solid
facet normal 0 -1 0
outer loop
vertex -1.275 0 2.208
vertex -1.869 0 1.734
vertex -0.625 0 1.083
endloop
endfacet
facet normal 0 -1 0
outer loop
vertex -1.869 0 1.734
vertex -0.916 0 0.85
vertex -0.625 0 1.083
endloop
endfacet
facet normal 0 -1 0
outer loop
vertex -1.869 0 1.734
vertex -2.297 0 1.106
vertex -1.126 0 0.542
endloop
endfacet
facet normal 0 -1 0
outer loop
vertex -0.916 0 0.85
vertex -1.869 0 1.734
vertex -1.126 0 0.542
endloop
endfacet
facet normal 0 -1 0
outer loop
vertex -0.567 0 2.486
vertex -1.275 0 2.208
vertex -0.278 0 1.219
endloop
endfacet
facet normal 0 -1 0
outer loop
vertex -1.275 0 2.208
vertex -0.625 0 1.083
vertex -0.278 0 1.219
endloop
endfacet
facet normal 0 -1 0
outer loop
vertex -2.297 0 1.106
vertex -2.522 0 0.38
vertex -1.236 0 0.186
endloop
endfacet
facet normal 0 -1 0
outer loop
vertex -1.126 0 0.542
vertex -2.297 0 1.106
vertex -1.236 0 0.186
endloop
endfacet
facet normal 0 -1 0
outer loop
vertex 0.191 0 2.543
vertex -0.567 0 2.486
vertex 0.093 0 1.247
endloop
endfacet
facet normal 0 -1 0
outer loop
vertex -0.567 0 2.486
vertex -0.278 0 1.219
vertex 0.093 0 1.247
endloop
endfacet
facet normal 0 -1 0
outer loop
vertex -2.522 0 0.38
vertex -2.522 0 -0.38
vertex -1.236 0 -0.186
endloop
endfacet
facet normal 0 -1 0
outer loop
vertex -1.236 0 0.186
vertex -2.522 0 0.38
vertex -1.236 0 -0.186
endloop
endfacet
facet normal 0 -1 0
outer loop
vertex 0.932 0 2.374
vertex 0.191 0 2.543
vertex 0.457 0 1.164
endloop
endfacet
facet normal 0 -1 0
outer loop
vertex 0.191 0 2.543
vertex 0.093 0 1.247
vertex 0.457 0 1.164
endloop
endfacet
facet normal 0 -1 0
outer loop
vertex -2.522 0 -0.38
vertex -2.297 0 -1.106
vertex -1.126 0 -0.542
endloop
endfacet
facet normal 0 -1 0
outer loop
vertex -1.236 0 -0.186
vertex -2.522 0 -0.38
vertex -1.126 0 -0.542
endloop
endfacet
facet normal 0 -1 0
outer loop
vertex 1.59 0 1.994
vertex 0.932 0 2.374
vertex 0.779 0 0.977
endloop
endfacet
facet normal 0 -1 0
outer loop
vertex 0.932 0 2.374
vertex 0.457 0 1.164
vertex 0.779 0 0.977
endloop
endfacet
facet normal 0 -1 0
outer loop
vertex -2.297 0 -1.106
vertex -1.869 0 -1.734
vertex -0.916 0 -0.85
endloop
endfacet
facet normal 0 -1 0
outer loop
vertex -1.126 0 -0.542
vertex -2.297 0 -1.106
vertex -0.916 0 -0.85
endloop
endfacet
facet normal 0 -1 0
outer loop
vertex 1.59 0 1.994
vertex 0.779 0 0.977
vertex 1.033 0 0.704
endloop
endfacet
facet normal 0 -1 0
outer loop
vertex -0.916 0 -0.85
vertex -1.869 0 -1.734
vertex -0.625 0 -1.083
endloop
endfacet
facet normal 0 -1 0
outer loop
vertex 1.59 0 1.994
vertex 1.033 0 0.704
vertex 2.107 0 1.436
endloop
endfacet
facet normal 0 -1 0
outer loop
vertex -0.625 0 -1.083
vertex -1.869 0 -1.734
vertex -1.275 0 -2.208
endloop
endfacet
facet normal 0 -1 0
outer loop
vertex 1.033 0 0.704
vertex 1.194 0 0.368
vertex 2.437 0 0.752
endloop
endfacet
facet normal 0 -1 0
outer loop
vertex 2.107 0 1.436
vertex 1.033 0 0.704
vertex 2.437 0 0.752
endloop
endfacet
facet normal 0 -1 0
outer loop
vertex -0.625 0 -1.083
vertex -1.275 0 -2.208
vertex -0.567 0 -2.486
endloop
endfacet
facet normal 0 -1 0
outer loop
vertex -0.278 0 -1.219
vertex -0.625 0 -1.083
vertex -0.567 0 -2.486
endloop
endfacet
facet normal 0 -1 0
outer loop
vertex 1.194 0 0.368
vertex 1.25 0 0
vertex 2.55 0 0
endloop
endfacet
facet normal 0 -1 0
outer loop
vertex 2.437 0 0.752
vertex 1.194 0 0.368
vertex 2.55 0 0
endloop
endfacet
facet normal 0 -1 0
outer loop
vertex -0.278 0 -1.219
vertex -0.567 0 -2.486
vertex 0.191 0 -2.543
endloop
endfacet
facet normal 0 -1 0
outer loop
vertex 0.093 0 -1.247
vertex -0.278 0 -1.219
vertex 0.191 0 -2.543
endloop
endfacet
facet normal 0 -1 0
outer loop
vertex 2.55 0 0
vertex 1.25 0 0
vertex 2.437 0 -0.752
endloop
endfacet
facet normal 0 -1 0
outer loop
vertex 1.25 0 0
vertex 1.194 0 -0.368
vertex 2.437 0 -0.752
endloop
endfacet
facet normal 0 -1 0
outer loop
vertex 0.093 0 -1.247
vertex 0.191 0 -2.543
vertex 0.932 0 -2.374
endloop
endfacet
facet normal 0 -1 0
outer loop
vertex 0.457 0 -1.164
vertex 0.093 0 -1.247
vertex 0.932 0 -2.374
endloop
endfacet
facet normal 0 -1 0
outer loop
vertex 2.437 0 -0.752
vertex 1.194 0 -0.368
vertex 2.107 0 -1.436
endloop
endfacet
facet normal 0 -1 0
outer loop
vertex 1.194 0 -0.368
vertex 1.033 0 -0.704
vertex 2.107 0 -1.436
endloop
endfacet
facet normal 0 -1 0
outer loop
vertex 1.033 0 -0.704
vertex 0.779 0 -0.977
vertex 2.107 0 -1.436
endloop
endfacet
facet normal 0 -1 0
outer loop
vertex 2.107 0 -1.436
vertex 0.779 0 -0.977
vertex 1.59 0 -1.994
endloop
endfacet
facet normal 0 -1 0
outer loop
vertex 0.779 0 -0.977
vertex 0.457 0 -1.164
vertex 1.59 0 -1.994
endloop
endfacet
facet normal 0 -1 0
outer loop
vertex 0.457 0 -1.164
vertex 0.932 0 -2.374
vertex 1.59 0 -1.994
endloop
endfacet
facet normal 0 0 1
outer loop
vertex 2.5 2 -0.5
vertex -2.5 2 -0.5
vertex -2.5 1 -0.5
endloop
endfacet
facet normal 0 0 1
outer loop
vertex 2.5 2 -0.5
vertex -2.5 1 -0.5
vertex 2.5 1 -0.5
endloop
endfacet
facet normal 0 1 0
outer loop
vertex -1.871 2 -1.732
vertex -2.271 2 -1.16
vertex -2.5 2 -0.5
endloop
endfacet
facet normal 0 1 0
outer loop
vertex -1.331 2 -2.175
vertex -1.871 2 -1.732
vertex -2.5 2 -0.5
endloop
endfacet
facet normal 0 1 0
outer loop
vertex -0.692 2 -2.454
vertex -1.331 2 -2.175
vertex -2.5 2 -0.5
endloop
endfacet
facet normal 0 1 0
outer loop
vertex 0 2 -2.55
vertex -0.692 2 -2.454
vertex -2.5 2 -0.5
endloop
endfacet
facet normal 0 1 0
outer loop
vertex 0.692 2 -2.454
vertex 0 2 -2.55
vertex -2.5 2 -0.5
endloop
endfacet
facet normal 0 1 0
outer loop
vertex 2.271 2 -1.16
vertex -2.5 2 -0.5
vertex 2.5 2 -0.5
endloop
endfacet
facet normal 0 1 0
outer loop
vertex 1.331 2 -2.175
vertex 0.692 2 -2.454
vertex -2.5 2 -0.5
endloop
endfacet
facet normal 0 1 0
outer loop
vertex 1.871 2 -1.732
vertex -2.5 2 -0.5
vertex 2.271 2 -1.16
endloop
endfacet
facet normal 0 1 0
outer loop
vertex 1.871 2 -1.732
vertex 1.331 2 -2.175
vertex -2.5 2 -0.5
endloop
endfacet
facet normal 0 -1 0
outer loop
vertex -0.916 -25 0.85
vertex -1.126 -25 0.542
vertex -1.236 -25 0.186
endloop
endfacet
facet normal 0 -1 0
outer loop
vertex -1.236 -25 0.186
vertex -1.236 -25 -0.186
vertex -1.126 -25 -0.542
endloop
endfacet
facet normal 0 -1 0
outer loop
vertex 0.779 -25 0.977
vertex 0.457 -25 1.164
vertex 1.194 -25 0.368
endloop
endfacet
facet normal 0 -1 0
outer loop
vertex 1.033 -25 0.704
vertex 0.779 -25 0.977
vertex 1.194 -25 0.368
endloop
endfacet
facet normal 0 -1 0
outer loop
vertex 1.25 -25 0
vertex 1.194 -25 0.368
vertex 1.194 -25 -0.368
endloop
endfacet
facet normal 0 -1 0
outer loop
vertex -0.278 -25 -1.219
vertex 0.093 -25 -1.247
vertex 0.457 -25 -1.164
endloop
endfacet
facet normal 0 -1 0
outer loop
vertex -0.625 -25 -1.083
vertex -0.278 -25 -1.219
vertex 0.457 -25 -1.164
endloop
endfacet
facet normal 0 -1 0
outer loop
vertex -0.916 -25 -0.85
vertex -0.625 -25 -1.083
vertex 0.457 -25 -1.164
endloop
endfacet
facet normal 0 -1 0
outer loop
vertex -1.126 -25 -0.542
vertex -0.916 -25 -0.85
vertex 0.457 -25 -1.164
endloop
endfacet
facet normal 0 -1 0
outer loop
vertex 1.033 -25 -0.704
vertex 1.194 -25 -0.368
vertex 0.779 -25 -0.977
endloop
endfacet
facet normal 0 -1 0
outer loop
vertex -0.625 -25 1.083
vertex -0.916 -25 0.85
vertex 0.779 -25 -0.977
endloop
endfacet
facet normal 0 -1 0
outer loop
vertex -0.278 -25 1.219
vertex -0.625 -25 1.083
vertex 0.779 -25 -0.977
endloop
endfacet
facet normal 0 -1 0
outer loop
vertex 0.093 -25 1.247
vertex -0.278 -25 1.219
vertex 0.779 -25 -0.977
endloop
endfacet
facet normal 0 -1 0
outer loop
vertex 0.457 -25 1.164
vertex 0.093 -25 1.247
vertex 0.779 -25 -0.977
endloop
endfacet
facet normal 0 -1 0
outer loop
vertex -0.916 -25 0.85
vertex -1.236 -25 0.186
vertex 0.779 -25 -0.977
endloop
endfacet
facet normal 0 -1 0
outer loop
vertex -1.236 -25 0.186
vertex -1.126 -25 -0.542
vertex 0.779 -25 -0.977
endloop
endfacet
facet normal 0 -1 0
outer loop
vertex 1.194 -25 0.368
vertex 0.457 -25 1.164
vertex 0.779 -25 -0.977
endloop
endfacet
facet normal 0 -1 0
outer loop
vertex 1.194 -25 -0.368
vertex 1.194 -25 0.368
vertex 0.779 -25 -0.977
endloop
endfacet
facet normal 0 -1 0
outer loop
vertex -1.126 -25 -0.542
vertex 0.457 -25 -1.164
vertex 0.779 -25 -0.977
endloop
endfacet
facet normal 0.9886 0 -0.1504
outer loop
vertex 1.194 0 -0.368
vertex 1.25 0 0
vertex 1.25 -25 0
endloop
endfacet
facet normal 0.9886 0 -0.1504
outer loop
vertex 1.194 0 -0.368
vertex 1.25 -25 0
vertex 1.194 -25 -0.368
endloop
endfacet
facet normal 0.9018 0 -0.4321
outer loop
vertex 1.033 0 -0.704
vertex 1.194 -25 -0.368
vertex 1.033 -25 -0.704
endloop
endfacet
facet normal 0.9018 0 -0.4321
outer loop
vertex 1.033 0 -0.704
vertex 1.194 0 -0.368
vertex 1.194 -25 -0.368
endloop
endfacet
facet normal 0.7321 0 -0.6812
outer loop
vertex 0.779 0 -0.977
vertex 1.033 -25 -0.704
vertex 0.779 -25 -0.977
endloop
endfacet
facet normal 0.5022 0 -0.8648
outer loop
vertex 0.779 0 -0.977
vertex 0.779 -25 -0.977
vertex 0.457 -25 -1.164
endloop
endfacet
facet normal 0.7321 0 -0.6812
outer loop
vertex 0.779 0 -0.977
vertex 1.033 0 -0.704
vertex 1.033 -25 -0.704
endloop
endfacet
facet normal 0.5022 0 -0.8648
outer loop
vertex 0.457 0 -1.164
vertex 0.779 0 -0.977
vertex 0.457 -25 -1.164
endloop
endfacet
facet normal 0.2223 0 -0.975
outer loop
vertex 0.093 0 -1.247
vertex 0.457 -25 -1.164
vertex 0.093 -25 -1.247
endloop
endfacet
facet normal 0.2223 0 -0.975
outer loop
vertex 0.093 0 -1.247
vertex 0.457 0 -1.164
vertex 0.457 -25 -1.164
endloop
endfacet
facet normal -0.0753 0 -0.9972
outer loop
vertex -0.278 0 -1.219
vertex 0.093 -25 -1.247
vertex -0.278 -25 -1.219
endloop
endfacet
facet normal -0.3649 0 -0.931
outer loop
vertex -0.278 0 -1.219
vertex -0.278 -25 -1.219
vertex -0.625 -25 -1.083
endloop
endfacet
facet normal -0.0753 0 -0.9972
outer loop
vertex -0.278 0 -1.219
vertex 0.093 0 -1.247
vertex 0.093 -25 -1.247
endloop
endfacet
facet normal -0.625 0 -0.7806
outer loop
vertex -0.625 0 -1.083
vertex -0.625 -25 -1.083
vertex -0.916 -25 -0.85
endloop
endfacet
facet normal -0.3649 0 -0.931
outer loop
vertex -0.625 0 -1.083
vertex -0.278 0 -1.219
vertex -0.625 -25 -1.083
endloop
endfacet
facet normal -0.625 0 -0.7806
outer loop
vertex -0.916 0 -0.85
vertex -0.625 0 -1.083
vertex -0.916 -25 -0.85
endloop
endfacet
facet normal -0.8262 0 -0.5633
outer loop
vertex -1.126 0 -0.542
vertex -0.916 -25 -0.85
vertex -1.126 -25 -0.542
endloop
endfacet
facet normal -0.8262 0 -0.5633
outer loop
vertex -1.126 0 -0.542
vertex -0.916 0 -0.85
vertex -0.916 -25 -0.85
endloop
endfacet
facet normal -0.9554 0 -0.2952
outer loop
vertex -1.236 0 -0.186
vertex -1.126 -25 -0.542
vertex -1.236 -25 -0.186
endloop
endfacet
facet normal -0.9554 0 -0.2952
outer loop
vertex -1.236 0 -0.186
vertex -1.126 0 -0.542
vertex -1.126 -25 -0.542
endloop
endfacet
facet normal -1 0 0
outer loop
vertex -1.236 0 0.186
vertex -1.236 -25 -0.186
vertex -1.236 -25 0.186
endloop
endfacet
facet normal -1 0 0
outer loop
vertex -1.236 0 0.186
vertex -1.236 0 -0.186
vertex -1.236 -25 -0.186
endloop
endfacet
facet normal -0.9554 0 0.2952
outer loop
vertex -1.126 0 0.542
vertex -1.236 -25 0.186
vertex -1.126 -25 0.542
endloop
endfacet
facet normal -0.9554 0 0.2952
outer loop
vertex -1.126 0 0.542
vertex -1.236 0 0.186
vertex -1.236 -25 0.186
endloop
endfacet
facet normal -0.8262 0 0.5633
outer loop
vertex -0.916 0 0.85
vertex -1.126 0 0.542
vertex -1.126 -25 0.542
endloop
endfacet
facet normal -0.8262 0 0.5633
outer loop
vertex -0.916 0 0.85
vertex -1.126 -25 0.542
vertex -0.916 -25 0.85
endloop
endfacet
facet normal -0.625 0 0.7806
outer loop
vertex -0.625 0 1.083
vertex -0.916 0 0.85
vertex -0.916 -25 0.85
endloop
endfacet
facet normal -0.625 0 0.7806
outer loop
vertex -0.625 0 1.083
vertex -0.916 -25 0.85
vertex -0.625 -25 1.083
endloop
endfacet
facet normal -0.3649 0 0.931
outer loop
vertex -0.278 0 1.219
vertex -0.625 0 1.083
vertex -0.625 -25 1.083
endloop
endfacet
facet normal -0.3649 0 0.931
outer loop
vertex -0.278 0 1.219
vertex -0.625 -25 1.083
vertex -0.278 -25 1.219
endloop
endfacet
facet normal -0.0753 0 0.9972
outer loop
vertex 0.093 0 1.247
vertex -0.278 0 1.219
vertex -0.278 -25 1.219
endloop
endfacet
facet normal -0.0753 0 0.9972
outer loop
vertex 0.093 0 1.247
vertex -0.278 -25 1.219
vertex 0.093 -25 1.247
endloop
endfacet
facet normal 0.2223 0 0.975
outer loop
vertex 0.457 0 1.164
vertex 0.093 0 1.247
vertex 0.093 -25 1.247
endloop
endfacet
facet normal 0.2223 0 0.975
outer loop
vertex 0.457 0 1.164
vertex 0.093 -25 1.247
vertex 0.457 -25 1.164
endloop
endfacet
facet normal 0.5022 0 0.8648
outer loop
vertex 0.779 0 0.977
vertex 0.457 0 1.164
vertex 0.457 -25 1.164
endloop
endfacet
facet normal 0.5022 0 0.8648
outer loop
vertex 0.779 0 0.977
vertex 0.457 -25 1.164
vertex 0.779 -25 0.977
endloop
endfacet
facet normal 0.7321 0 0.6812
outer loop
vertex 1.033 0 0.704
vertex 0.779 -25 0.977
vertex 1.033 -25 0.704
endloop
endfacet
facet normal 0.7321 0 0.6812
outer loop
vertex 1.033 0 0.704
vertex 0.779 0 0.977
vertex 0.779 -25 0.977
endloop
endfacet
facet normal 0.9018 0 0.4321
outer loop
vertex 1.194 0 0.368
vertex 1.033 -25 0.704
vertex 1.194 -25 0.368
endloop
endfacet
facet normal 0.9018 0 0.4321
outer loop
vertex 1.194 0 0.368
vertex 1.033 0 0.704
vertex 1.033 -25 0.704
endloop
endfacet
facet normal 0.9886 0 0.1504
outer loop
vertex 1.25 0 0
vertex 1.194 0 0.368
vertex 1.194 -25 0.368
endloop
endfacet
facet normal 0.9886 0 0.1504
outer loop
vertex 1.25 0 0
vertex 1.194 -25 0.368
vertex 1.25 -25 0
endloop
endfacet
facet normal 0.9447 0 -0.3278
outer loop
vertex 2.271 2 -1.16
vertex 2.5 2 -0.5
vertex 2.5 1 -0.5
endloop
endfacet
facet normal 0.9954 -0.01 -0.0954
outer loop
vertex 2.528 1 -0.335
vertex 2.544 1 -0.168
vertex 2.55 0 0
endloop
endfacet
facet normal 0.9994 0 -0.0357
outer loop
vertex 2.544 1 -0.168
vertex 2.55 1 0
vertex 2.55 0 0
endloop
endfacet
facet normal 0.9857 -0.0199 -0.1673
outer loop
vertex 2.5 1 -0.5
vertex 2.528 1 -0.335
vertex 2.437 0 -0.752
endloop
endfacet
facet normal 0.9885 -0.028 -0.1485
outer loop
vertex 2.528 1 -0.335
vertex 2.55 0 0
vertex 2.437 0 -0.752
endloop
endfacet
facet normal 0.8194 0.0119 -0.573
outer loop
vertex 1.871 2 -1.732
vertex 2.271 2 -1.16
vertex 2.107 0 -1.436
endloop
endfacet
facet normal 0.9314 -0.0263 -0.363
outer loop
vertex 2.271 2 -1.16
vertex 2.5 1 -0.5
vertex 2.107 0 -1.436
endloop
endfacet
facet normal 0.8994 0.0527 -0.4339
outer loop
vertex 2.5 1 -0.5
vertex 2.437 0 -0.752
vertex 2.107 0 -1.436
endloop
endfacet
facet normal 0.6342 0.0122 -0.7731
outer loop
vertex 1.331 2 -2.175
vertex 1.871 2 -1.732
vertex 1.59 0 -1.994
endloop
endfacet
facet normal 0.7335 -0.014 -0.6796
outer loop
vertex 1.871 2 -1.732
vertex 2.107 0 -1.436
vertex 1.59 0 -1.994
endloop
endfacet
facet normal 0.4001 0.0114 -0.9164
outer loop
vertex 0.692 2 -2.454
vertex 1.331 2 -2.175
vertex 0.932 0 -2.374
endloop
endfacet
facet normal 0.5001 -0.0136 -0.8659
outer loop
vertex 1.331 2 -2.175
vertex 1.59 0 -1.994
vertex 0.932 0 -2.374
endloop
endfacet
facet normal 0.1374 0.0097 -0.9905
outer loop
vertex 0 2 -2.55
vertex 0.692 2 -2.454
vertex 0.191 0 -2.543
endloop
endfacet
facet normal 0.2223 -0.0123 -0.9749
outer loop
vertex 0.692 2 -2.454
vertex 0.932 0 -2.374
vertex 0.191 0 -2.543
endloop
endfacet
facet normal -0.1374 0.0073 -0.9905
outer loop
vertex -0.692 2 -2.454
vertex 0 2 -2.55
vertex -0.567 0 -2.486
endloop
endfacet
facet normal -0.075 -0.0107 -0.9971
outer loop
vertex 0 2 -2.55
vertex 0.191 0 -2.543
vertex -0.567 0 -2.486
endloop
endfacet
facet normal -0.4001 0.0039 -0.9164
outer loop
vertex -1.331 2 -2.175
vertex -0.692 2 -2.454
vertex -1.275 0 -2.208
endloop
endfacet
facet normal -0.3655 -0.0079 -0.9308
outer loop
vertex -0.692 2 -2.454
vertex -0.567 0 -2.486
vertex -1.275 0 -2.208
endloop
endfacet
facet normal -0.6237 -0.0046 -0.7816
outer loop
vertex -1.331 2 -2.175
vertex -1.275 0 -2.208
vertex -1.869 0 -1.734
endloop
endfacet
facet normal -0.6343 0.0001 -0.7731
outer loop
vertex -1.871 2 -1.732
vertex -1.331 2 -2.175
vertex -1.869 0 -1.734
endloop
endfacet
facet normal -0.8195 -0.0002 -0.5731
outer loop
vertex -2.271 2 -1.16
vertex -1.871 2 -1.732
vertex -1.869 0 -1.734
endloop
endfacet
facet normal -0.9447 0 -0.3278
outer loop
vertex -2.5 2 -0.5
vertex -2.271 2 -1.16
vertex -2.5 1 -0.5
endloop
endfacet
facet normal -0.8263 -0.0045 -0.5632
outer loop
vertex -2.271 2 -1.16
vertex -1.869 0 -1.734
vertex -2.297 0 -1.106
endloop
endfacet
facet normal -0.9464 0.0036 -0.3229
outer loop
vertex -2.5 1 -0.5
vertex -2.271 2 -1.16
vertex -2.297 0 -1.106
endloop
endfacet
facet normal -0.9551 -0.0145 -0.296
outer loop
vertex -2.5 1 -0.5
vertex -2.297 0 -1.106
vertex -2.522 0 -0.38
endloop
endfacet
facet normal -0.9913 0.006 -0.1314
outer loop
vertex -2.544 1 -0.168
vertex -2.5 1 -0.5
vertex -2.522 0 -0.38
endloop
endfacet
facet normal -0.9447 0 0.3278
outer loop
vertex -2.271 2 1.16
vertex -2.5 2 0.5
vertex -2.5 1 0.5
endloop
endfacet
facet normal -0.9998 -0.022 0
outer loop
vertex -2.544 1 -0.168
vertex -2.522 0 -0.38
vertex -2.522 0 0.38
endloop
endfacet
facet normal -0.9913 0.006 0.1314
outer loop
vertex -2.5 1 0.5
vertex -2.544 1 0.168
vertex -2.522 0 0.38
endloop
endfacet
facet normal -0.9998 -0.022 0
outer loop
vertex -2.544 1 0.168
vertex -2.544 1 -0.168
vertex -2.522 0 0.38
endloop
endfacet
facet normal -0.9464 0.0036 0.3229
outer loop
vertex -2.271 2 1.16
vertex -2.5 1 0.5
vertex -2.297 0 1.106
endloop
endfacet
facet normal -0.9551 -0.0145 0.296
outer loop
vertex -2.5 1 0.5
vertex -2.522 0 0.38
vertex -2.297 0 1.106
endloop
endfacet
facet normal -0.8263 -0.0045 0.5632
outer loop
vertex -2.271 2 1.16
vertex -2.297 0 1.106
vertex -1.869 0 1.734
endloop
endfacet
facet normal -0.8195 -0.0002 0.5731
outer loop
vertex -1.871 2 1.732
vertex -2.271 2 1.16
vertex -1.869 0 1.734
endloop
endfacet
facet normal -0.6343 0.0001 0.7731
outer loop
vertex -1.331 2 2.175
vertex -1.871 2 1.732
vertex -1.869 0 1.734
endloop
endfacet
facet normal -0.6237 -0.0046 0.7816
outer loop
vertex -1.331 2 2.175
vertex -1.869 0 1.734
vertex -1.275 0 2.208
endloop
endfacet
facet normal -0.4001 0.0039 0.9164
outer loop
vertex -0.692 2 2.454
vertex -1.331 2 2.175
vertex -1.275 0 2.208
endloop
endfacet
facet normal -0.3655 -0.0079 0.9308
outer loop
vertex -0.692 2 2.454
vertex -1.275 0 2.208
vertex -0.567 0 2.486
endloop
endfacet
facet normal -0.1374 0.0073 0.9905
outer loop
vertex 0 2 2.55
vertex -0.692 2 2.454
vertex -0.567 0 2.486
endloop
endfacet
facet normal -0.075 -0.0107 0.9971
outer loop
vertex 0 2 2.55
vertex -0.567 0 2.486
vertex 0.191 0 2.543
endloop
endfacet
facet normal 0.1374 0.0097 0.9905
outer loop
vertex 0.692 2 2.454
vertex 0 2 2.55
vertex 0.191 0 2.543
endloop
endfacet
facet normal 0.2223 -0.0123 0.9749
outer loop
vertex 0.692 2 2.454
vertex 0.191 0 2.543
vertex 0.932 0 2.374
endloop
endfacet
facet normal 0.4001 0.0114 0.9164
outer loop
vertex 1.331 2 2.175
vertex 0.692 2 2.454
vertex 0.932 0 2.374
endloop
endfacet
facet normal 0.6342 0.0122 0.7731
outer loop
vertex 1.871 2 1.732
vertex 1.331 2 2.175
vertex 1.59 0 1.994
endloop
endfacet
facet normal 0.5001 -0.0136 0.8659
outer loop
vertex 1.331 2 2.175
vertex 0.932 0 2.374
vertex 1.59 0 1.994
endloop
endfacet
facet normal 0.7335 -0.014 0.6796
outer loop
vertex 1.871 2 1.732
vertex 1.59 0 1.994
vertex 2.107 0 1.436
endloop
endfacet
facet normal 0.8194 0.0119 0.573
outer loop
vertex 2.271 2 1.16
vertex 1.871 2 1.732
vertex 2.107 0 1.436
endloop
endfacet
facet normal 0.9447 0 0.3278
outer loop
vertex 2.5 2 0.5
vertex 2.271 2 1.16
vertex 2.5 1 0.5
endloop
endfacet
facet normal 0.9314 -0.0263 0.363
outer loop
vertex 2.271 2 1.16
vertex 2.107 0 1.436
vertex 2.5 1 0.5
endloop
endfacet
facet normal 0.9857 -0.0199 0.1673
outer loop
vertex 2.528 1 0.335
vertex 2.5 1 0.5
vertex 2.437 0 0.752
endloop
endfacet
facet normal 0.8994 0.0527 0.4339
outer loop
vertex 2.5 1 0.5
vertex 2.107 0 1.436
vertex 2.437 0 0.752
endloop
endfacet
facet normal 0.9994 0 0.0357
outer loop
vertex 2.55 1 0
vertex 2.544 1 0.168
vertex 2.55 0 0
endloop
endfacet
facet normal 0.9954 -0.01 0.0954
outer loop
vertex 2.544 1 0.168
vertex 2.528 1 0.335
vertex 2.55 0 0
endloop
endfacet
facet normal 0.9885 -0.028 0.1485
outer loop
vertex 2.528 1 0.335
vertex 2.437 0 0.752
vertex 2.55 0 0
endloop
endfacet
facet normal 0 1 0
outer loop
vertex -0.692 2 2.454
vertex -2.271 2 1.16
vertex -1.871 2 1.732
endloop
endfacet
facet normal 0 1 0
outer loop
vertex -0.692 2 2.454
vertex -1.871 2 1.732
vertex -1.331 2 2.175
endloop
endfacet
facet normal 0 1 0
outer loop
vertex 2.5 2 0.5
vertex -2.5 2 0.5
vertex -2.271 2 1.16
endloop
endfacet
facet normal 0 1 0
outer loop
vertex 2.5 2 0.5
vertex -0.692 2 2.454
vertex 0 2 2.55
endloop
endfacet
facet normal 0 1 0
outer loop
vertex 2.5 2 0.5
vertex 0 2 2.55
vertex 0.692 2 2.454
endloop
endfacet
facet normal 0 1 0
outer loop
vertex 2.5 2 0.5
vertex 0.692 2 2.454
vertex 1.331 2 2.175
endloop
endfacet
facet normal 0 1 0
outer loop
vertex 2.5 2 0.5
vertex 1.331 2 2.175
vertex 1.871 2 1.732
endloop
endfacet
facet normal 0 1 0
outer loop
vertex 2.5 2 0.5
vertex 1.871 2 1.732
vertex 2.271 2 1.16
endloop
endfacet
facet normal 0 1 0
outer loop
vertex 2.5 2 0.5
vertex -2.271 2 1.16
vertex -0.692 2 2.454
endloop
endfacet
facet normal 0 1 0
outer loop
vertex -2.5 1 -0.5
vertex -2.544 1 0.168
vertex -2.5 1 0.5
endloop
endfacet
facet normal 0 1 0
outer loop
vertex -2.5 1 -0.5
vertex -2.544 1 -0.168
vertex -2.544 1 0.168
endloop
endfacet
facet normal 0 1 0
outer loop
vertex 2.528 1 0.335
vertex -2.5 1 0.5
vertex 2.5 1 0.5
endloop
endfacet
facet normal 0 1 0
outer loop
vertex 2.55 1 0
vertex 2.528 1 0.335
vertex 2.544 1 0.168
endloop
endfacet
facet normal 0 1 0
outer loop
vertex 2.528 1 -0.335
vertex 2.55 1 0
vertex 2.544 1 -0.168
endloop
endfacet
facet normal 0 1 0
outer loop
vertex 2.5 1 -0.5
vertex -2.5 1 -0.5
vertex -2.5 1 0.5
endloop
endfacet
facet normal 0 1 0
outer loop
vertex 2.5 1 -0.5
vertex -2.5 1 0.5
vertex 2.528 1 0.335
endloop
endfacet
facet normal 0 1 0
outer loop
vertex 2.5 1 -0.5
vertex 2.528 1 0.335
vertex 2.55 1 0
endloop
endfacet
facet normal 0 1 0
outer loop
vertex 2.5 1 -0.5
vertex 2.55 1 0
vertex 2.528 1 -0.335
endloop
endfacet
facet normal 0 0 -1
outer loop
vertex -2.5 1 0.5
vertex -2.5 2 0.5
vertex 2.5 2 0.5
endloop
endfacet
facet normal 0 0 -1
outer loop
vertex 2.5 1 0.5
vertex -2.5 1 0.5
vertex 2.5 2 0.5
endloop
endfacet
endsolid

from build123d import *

# Parameters (mm, degrees)
SKETCH1_R           = 2.55
BOSS_EXTRUDE1_DEPTH = 2
SKETCH2_R           = 1.25
BOSS_EXTRUDE2_DEPTH = 25
SKETCH3_W           = 6
SKETCH3_H           = 1
CUT_EXTRUDE1_DEPTH  = 1


with BuildPart() as part:
    # Sketch1 → Boss-Extrude1 (new body)
    with BuildSketch(Plane(origin=(0, 0, 0), x_dir=(1, 0, 0), z_dir=(0, 1, 0))):
        Circle(SKETCH1_R)
    extrude(amount=BOSS_EXTRUDE1_DEPTH)

    # Sketch2 → Boss-Extrude2 (add)
    with BuildSketch(Plane(origin=(0, 0, 0), x_dir=(1, 0, 0), z_dir=(0, 1, 0))):
        Circle(SKETCH2_R)
    extrude(amount=-BOSS_EXTRUDE2_DEPTH)

    # Sketch3 → Cut-Extrude1 (cut)
    with BuildSketch(Plane(origin=(0, 2, 0), x_dir=(1, 0, 0), z_dir=(0, 1, 0))):
        Rectangle(SKETCH3_W, SKETCH3_H)
    extrude(amount=-CUT_EXTRUDE1_DEPTH, mode=Mode.SUBTRACT)


solid = part.part
